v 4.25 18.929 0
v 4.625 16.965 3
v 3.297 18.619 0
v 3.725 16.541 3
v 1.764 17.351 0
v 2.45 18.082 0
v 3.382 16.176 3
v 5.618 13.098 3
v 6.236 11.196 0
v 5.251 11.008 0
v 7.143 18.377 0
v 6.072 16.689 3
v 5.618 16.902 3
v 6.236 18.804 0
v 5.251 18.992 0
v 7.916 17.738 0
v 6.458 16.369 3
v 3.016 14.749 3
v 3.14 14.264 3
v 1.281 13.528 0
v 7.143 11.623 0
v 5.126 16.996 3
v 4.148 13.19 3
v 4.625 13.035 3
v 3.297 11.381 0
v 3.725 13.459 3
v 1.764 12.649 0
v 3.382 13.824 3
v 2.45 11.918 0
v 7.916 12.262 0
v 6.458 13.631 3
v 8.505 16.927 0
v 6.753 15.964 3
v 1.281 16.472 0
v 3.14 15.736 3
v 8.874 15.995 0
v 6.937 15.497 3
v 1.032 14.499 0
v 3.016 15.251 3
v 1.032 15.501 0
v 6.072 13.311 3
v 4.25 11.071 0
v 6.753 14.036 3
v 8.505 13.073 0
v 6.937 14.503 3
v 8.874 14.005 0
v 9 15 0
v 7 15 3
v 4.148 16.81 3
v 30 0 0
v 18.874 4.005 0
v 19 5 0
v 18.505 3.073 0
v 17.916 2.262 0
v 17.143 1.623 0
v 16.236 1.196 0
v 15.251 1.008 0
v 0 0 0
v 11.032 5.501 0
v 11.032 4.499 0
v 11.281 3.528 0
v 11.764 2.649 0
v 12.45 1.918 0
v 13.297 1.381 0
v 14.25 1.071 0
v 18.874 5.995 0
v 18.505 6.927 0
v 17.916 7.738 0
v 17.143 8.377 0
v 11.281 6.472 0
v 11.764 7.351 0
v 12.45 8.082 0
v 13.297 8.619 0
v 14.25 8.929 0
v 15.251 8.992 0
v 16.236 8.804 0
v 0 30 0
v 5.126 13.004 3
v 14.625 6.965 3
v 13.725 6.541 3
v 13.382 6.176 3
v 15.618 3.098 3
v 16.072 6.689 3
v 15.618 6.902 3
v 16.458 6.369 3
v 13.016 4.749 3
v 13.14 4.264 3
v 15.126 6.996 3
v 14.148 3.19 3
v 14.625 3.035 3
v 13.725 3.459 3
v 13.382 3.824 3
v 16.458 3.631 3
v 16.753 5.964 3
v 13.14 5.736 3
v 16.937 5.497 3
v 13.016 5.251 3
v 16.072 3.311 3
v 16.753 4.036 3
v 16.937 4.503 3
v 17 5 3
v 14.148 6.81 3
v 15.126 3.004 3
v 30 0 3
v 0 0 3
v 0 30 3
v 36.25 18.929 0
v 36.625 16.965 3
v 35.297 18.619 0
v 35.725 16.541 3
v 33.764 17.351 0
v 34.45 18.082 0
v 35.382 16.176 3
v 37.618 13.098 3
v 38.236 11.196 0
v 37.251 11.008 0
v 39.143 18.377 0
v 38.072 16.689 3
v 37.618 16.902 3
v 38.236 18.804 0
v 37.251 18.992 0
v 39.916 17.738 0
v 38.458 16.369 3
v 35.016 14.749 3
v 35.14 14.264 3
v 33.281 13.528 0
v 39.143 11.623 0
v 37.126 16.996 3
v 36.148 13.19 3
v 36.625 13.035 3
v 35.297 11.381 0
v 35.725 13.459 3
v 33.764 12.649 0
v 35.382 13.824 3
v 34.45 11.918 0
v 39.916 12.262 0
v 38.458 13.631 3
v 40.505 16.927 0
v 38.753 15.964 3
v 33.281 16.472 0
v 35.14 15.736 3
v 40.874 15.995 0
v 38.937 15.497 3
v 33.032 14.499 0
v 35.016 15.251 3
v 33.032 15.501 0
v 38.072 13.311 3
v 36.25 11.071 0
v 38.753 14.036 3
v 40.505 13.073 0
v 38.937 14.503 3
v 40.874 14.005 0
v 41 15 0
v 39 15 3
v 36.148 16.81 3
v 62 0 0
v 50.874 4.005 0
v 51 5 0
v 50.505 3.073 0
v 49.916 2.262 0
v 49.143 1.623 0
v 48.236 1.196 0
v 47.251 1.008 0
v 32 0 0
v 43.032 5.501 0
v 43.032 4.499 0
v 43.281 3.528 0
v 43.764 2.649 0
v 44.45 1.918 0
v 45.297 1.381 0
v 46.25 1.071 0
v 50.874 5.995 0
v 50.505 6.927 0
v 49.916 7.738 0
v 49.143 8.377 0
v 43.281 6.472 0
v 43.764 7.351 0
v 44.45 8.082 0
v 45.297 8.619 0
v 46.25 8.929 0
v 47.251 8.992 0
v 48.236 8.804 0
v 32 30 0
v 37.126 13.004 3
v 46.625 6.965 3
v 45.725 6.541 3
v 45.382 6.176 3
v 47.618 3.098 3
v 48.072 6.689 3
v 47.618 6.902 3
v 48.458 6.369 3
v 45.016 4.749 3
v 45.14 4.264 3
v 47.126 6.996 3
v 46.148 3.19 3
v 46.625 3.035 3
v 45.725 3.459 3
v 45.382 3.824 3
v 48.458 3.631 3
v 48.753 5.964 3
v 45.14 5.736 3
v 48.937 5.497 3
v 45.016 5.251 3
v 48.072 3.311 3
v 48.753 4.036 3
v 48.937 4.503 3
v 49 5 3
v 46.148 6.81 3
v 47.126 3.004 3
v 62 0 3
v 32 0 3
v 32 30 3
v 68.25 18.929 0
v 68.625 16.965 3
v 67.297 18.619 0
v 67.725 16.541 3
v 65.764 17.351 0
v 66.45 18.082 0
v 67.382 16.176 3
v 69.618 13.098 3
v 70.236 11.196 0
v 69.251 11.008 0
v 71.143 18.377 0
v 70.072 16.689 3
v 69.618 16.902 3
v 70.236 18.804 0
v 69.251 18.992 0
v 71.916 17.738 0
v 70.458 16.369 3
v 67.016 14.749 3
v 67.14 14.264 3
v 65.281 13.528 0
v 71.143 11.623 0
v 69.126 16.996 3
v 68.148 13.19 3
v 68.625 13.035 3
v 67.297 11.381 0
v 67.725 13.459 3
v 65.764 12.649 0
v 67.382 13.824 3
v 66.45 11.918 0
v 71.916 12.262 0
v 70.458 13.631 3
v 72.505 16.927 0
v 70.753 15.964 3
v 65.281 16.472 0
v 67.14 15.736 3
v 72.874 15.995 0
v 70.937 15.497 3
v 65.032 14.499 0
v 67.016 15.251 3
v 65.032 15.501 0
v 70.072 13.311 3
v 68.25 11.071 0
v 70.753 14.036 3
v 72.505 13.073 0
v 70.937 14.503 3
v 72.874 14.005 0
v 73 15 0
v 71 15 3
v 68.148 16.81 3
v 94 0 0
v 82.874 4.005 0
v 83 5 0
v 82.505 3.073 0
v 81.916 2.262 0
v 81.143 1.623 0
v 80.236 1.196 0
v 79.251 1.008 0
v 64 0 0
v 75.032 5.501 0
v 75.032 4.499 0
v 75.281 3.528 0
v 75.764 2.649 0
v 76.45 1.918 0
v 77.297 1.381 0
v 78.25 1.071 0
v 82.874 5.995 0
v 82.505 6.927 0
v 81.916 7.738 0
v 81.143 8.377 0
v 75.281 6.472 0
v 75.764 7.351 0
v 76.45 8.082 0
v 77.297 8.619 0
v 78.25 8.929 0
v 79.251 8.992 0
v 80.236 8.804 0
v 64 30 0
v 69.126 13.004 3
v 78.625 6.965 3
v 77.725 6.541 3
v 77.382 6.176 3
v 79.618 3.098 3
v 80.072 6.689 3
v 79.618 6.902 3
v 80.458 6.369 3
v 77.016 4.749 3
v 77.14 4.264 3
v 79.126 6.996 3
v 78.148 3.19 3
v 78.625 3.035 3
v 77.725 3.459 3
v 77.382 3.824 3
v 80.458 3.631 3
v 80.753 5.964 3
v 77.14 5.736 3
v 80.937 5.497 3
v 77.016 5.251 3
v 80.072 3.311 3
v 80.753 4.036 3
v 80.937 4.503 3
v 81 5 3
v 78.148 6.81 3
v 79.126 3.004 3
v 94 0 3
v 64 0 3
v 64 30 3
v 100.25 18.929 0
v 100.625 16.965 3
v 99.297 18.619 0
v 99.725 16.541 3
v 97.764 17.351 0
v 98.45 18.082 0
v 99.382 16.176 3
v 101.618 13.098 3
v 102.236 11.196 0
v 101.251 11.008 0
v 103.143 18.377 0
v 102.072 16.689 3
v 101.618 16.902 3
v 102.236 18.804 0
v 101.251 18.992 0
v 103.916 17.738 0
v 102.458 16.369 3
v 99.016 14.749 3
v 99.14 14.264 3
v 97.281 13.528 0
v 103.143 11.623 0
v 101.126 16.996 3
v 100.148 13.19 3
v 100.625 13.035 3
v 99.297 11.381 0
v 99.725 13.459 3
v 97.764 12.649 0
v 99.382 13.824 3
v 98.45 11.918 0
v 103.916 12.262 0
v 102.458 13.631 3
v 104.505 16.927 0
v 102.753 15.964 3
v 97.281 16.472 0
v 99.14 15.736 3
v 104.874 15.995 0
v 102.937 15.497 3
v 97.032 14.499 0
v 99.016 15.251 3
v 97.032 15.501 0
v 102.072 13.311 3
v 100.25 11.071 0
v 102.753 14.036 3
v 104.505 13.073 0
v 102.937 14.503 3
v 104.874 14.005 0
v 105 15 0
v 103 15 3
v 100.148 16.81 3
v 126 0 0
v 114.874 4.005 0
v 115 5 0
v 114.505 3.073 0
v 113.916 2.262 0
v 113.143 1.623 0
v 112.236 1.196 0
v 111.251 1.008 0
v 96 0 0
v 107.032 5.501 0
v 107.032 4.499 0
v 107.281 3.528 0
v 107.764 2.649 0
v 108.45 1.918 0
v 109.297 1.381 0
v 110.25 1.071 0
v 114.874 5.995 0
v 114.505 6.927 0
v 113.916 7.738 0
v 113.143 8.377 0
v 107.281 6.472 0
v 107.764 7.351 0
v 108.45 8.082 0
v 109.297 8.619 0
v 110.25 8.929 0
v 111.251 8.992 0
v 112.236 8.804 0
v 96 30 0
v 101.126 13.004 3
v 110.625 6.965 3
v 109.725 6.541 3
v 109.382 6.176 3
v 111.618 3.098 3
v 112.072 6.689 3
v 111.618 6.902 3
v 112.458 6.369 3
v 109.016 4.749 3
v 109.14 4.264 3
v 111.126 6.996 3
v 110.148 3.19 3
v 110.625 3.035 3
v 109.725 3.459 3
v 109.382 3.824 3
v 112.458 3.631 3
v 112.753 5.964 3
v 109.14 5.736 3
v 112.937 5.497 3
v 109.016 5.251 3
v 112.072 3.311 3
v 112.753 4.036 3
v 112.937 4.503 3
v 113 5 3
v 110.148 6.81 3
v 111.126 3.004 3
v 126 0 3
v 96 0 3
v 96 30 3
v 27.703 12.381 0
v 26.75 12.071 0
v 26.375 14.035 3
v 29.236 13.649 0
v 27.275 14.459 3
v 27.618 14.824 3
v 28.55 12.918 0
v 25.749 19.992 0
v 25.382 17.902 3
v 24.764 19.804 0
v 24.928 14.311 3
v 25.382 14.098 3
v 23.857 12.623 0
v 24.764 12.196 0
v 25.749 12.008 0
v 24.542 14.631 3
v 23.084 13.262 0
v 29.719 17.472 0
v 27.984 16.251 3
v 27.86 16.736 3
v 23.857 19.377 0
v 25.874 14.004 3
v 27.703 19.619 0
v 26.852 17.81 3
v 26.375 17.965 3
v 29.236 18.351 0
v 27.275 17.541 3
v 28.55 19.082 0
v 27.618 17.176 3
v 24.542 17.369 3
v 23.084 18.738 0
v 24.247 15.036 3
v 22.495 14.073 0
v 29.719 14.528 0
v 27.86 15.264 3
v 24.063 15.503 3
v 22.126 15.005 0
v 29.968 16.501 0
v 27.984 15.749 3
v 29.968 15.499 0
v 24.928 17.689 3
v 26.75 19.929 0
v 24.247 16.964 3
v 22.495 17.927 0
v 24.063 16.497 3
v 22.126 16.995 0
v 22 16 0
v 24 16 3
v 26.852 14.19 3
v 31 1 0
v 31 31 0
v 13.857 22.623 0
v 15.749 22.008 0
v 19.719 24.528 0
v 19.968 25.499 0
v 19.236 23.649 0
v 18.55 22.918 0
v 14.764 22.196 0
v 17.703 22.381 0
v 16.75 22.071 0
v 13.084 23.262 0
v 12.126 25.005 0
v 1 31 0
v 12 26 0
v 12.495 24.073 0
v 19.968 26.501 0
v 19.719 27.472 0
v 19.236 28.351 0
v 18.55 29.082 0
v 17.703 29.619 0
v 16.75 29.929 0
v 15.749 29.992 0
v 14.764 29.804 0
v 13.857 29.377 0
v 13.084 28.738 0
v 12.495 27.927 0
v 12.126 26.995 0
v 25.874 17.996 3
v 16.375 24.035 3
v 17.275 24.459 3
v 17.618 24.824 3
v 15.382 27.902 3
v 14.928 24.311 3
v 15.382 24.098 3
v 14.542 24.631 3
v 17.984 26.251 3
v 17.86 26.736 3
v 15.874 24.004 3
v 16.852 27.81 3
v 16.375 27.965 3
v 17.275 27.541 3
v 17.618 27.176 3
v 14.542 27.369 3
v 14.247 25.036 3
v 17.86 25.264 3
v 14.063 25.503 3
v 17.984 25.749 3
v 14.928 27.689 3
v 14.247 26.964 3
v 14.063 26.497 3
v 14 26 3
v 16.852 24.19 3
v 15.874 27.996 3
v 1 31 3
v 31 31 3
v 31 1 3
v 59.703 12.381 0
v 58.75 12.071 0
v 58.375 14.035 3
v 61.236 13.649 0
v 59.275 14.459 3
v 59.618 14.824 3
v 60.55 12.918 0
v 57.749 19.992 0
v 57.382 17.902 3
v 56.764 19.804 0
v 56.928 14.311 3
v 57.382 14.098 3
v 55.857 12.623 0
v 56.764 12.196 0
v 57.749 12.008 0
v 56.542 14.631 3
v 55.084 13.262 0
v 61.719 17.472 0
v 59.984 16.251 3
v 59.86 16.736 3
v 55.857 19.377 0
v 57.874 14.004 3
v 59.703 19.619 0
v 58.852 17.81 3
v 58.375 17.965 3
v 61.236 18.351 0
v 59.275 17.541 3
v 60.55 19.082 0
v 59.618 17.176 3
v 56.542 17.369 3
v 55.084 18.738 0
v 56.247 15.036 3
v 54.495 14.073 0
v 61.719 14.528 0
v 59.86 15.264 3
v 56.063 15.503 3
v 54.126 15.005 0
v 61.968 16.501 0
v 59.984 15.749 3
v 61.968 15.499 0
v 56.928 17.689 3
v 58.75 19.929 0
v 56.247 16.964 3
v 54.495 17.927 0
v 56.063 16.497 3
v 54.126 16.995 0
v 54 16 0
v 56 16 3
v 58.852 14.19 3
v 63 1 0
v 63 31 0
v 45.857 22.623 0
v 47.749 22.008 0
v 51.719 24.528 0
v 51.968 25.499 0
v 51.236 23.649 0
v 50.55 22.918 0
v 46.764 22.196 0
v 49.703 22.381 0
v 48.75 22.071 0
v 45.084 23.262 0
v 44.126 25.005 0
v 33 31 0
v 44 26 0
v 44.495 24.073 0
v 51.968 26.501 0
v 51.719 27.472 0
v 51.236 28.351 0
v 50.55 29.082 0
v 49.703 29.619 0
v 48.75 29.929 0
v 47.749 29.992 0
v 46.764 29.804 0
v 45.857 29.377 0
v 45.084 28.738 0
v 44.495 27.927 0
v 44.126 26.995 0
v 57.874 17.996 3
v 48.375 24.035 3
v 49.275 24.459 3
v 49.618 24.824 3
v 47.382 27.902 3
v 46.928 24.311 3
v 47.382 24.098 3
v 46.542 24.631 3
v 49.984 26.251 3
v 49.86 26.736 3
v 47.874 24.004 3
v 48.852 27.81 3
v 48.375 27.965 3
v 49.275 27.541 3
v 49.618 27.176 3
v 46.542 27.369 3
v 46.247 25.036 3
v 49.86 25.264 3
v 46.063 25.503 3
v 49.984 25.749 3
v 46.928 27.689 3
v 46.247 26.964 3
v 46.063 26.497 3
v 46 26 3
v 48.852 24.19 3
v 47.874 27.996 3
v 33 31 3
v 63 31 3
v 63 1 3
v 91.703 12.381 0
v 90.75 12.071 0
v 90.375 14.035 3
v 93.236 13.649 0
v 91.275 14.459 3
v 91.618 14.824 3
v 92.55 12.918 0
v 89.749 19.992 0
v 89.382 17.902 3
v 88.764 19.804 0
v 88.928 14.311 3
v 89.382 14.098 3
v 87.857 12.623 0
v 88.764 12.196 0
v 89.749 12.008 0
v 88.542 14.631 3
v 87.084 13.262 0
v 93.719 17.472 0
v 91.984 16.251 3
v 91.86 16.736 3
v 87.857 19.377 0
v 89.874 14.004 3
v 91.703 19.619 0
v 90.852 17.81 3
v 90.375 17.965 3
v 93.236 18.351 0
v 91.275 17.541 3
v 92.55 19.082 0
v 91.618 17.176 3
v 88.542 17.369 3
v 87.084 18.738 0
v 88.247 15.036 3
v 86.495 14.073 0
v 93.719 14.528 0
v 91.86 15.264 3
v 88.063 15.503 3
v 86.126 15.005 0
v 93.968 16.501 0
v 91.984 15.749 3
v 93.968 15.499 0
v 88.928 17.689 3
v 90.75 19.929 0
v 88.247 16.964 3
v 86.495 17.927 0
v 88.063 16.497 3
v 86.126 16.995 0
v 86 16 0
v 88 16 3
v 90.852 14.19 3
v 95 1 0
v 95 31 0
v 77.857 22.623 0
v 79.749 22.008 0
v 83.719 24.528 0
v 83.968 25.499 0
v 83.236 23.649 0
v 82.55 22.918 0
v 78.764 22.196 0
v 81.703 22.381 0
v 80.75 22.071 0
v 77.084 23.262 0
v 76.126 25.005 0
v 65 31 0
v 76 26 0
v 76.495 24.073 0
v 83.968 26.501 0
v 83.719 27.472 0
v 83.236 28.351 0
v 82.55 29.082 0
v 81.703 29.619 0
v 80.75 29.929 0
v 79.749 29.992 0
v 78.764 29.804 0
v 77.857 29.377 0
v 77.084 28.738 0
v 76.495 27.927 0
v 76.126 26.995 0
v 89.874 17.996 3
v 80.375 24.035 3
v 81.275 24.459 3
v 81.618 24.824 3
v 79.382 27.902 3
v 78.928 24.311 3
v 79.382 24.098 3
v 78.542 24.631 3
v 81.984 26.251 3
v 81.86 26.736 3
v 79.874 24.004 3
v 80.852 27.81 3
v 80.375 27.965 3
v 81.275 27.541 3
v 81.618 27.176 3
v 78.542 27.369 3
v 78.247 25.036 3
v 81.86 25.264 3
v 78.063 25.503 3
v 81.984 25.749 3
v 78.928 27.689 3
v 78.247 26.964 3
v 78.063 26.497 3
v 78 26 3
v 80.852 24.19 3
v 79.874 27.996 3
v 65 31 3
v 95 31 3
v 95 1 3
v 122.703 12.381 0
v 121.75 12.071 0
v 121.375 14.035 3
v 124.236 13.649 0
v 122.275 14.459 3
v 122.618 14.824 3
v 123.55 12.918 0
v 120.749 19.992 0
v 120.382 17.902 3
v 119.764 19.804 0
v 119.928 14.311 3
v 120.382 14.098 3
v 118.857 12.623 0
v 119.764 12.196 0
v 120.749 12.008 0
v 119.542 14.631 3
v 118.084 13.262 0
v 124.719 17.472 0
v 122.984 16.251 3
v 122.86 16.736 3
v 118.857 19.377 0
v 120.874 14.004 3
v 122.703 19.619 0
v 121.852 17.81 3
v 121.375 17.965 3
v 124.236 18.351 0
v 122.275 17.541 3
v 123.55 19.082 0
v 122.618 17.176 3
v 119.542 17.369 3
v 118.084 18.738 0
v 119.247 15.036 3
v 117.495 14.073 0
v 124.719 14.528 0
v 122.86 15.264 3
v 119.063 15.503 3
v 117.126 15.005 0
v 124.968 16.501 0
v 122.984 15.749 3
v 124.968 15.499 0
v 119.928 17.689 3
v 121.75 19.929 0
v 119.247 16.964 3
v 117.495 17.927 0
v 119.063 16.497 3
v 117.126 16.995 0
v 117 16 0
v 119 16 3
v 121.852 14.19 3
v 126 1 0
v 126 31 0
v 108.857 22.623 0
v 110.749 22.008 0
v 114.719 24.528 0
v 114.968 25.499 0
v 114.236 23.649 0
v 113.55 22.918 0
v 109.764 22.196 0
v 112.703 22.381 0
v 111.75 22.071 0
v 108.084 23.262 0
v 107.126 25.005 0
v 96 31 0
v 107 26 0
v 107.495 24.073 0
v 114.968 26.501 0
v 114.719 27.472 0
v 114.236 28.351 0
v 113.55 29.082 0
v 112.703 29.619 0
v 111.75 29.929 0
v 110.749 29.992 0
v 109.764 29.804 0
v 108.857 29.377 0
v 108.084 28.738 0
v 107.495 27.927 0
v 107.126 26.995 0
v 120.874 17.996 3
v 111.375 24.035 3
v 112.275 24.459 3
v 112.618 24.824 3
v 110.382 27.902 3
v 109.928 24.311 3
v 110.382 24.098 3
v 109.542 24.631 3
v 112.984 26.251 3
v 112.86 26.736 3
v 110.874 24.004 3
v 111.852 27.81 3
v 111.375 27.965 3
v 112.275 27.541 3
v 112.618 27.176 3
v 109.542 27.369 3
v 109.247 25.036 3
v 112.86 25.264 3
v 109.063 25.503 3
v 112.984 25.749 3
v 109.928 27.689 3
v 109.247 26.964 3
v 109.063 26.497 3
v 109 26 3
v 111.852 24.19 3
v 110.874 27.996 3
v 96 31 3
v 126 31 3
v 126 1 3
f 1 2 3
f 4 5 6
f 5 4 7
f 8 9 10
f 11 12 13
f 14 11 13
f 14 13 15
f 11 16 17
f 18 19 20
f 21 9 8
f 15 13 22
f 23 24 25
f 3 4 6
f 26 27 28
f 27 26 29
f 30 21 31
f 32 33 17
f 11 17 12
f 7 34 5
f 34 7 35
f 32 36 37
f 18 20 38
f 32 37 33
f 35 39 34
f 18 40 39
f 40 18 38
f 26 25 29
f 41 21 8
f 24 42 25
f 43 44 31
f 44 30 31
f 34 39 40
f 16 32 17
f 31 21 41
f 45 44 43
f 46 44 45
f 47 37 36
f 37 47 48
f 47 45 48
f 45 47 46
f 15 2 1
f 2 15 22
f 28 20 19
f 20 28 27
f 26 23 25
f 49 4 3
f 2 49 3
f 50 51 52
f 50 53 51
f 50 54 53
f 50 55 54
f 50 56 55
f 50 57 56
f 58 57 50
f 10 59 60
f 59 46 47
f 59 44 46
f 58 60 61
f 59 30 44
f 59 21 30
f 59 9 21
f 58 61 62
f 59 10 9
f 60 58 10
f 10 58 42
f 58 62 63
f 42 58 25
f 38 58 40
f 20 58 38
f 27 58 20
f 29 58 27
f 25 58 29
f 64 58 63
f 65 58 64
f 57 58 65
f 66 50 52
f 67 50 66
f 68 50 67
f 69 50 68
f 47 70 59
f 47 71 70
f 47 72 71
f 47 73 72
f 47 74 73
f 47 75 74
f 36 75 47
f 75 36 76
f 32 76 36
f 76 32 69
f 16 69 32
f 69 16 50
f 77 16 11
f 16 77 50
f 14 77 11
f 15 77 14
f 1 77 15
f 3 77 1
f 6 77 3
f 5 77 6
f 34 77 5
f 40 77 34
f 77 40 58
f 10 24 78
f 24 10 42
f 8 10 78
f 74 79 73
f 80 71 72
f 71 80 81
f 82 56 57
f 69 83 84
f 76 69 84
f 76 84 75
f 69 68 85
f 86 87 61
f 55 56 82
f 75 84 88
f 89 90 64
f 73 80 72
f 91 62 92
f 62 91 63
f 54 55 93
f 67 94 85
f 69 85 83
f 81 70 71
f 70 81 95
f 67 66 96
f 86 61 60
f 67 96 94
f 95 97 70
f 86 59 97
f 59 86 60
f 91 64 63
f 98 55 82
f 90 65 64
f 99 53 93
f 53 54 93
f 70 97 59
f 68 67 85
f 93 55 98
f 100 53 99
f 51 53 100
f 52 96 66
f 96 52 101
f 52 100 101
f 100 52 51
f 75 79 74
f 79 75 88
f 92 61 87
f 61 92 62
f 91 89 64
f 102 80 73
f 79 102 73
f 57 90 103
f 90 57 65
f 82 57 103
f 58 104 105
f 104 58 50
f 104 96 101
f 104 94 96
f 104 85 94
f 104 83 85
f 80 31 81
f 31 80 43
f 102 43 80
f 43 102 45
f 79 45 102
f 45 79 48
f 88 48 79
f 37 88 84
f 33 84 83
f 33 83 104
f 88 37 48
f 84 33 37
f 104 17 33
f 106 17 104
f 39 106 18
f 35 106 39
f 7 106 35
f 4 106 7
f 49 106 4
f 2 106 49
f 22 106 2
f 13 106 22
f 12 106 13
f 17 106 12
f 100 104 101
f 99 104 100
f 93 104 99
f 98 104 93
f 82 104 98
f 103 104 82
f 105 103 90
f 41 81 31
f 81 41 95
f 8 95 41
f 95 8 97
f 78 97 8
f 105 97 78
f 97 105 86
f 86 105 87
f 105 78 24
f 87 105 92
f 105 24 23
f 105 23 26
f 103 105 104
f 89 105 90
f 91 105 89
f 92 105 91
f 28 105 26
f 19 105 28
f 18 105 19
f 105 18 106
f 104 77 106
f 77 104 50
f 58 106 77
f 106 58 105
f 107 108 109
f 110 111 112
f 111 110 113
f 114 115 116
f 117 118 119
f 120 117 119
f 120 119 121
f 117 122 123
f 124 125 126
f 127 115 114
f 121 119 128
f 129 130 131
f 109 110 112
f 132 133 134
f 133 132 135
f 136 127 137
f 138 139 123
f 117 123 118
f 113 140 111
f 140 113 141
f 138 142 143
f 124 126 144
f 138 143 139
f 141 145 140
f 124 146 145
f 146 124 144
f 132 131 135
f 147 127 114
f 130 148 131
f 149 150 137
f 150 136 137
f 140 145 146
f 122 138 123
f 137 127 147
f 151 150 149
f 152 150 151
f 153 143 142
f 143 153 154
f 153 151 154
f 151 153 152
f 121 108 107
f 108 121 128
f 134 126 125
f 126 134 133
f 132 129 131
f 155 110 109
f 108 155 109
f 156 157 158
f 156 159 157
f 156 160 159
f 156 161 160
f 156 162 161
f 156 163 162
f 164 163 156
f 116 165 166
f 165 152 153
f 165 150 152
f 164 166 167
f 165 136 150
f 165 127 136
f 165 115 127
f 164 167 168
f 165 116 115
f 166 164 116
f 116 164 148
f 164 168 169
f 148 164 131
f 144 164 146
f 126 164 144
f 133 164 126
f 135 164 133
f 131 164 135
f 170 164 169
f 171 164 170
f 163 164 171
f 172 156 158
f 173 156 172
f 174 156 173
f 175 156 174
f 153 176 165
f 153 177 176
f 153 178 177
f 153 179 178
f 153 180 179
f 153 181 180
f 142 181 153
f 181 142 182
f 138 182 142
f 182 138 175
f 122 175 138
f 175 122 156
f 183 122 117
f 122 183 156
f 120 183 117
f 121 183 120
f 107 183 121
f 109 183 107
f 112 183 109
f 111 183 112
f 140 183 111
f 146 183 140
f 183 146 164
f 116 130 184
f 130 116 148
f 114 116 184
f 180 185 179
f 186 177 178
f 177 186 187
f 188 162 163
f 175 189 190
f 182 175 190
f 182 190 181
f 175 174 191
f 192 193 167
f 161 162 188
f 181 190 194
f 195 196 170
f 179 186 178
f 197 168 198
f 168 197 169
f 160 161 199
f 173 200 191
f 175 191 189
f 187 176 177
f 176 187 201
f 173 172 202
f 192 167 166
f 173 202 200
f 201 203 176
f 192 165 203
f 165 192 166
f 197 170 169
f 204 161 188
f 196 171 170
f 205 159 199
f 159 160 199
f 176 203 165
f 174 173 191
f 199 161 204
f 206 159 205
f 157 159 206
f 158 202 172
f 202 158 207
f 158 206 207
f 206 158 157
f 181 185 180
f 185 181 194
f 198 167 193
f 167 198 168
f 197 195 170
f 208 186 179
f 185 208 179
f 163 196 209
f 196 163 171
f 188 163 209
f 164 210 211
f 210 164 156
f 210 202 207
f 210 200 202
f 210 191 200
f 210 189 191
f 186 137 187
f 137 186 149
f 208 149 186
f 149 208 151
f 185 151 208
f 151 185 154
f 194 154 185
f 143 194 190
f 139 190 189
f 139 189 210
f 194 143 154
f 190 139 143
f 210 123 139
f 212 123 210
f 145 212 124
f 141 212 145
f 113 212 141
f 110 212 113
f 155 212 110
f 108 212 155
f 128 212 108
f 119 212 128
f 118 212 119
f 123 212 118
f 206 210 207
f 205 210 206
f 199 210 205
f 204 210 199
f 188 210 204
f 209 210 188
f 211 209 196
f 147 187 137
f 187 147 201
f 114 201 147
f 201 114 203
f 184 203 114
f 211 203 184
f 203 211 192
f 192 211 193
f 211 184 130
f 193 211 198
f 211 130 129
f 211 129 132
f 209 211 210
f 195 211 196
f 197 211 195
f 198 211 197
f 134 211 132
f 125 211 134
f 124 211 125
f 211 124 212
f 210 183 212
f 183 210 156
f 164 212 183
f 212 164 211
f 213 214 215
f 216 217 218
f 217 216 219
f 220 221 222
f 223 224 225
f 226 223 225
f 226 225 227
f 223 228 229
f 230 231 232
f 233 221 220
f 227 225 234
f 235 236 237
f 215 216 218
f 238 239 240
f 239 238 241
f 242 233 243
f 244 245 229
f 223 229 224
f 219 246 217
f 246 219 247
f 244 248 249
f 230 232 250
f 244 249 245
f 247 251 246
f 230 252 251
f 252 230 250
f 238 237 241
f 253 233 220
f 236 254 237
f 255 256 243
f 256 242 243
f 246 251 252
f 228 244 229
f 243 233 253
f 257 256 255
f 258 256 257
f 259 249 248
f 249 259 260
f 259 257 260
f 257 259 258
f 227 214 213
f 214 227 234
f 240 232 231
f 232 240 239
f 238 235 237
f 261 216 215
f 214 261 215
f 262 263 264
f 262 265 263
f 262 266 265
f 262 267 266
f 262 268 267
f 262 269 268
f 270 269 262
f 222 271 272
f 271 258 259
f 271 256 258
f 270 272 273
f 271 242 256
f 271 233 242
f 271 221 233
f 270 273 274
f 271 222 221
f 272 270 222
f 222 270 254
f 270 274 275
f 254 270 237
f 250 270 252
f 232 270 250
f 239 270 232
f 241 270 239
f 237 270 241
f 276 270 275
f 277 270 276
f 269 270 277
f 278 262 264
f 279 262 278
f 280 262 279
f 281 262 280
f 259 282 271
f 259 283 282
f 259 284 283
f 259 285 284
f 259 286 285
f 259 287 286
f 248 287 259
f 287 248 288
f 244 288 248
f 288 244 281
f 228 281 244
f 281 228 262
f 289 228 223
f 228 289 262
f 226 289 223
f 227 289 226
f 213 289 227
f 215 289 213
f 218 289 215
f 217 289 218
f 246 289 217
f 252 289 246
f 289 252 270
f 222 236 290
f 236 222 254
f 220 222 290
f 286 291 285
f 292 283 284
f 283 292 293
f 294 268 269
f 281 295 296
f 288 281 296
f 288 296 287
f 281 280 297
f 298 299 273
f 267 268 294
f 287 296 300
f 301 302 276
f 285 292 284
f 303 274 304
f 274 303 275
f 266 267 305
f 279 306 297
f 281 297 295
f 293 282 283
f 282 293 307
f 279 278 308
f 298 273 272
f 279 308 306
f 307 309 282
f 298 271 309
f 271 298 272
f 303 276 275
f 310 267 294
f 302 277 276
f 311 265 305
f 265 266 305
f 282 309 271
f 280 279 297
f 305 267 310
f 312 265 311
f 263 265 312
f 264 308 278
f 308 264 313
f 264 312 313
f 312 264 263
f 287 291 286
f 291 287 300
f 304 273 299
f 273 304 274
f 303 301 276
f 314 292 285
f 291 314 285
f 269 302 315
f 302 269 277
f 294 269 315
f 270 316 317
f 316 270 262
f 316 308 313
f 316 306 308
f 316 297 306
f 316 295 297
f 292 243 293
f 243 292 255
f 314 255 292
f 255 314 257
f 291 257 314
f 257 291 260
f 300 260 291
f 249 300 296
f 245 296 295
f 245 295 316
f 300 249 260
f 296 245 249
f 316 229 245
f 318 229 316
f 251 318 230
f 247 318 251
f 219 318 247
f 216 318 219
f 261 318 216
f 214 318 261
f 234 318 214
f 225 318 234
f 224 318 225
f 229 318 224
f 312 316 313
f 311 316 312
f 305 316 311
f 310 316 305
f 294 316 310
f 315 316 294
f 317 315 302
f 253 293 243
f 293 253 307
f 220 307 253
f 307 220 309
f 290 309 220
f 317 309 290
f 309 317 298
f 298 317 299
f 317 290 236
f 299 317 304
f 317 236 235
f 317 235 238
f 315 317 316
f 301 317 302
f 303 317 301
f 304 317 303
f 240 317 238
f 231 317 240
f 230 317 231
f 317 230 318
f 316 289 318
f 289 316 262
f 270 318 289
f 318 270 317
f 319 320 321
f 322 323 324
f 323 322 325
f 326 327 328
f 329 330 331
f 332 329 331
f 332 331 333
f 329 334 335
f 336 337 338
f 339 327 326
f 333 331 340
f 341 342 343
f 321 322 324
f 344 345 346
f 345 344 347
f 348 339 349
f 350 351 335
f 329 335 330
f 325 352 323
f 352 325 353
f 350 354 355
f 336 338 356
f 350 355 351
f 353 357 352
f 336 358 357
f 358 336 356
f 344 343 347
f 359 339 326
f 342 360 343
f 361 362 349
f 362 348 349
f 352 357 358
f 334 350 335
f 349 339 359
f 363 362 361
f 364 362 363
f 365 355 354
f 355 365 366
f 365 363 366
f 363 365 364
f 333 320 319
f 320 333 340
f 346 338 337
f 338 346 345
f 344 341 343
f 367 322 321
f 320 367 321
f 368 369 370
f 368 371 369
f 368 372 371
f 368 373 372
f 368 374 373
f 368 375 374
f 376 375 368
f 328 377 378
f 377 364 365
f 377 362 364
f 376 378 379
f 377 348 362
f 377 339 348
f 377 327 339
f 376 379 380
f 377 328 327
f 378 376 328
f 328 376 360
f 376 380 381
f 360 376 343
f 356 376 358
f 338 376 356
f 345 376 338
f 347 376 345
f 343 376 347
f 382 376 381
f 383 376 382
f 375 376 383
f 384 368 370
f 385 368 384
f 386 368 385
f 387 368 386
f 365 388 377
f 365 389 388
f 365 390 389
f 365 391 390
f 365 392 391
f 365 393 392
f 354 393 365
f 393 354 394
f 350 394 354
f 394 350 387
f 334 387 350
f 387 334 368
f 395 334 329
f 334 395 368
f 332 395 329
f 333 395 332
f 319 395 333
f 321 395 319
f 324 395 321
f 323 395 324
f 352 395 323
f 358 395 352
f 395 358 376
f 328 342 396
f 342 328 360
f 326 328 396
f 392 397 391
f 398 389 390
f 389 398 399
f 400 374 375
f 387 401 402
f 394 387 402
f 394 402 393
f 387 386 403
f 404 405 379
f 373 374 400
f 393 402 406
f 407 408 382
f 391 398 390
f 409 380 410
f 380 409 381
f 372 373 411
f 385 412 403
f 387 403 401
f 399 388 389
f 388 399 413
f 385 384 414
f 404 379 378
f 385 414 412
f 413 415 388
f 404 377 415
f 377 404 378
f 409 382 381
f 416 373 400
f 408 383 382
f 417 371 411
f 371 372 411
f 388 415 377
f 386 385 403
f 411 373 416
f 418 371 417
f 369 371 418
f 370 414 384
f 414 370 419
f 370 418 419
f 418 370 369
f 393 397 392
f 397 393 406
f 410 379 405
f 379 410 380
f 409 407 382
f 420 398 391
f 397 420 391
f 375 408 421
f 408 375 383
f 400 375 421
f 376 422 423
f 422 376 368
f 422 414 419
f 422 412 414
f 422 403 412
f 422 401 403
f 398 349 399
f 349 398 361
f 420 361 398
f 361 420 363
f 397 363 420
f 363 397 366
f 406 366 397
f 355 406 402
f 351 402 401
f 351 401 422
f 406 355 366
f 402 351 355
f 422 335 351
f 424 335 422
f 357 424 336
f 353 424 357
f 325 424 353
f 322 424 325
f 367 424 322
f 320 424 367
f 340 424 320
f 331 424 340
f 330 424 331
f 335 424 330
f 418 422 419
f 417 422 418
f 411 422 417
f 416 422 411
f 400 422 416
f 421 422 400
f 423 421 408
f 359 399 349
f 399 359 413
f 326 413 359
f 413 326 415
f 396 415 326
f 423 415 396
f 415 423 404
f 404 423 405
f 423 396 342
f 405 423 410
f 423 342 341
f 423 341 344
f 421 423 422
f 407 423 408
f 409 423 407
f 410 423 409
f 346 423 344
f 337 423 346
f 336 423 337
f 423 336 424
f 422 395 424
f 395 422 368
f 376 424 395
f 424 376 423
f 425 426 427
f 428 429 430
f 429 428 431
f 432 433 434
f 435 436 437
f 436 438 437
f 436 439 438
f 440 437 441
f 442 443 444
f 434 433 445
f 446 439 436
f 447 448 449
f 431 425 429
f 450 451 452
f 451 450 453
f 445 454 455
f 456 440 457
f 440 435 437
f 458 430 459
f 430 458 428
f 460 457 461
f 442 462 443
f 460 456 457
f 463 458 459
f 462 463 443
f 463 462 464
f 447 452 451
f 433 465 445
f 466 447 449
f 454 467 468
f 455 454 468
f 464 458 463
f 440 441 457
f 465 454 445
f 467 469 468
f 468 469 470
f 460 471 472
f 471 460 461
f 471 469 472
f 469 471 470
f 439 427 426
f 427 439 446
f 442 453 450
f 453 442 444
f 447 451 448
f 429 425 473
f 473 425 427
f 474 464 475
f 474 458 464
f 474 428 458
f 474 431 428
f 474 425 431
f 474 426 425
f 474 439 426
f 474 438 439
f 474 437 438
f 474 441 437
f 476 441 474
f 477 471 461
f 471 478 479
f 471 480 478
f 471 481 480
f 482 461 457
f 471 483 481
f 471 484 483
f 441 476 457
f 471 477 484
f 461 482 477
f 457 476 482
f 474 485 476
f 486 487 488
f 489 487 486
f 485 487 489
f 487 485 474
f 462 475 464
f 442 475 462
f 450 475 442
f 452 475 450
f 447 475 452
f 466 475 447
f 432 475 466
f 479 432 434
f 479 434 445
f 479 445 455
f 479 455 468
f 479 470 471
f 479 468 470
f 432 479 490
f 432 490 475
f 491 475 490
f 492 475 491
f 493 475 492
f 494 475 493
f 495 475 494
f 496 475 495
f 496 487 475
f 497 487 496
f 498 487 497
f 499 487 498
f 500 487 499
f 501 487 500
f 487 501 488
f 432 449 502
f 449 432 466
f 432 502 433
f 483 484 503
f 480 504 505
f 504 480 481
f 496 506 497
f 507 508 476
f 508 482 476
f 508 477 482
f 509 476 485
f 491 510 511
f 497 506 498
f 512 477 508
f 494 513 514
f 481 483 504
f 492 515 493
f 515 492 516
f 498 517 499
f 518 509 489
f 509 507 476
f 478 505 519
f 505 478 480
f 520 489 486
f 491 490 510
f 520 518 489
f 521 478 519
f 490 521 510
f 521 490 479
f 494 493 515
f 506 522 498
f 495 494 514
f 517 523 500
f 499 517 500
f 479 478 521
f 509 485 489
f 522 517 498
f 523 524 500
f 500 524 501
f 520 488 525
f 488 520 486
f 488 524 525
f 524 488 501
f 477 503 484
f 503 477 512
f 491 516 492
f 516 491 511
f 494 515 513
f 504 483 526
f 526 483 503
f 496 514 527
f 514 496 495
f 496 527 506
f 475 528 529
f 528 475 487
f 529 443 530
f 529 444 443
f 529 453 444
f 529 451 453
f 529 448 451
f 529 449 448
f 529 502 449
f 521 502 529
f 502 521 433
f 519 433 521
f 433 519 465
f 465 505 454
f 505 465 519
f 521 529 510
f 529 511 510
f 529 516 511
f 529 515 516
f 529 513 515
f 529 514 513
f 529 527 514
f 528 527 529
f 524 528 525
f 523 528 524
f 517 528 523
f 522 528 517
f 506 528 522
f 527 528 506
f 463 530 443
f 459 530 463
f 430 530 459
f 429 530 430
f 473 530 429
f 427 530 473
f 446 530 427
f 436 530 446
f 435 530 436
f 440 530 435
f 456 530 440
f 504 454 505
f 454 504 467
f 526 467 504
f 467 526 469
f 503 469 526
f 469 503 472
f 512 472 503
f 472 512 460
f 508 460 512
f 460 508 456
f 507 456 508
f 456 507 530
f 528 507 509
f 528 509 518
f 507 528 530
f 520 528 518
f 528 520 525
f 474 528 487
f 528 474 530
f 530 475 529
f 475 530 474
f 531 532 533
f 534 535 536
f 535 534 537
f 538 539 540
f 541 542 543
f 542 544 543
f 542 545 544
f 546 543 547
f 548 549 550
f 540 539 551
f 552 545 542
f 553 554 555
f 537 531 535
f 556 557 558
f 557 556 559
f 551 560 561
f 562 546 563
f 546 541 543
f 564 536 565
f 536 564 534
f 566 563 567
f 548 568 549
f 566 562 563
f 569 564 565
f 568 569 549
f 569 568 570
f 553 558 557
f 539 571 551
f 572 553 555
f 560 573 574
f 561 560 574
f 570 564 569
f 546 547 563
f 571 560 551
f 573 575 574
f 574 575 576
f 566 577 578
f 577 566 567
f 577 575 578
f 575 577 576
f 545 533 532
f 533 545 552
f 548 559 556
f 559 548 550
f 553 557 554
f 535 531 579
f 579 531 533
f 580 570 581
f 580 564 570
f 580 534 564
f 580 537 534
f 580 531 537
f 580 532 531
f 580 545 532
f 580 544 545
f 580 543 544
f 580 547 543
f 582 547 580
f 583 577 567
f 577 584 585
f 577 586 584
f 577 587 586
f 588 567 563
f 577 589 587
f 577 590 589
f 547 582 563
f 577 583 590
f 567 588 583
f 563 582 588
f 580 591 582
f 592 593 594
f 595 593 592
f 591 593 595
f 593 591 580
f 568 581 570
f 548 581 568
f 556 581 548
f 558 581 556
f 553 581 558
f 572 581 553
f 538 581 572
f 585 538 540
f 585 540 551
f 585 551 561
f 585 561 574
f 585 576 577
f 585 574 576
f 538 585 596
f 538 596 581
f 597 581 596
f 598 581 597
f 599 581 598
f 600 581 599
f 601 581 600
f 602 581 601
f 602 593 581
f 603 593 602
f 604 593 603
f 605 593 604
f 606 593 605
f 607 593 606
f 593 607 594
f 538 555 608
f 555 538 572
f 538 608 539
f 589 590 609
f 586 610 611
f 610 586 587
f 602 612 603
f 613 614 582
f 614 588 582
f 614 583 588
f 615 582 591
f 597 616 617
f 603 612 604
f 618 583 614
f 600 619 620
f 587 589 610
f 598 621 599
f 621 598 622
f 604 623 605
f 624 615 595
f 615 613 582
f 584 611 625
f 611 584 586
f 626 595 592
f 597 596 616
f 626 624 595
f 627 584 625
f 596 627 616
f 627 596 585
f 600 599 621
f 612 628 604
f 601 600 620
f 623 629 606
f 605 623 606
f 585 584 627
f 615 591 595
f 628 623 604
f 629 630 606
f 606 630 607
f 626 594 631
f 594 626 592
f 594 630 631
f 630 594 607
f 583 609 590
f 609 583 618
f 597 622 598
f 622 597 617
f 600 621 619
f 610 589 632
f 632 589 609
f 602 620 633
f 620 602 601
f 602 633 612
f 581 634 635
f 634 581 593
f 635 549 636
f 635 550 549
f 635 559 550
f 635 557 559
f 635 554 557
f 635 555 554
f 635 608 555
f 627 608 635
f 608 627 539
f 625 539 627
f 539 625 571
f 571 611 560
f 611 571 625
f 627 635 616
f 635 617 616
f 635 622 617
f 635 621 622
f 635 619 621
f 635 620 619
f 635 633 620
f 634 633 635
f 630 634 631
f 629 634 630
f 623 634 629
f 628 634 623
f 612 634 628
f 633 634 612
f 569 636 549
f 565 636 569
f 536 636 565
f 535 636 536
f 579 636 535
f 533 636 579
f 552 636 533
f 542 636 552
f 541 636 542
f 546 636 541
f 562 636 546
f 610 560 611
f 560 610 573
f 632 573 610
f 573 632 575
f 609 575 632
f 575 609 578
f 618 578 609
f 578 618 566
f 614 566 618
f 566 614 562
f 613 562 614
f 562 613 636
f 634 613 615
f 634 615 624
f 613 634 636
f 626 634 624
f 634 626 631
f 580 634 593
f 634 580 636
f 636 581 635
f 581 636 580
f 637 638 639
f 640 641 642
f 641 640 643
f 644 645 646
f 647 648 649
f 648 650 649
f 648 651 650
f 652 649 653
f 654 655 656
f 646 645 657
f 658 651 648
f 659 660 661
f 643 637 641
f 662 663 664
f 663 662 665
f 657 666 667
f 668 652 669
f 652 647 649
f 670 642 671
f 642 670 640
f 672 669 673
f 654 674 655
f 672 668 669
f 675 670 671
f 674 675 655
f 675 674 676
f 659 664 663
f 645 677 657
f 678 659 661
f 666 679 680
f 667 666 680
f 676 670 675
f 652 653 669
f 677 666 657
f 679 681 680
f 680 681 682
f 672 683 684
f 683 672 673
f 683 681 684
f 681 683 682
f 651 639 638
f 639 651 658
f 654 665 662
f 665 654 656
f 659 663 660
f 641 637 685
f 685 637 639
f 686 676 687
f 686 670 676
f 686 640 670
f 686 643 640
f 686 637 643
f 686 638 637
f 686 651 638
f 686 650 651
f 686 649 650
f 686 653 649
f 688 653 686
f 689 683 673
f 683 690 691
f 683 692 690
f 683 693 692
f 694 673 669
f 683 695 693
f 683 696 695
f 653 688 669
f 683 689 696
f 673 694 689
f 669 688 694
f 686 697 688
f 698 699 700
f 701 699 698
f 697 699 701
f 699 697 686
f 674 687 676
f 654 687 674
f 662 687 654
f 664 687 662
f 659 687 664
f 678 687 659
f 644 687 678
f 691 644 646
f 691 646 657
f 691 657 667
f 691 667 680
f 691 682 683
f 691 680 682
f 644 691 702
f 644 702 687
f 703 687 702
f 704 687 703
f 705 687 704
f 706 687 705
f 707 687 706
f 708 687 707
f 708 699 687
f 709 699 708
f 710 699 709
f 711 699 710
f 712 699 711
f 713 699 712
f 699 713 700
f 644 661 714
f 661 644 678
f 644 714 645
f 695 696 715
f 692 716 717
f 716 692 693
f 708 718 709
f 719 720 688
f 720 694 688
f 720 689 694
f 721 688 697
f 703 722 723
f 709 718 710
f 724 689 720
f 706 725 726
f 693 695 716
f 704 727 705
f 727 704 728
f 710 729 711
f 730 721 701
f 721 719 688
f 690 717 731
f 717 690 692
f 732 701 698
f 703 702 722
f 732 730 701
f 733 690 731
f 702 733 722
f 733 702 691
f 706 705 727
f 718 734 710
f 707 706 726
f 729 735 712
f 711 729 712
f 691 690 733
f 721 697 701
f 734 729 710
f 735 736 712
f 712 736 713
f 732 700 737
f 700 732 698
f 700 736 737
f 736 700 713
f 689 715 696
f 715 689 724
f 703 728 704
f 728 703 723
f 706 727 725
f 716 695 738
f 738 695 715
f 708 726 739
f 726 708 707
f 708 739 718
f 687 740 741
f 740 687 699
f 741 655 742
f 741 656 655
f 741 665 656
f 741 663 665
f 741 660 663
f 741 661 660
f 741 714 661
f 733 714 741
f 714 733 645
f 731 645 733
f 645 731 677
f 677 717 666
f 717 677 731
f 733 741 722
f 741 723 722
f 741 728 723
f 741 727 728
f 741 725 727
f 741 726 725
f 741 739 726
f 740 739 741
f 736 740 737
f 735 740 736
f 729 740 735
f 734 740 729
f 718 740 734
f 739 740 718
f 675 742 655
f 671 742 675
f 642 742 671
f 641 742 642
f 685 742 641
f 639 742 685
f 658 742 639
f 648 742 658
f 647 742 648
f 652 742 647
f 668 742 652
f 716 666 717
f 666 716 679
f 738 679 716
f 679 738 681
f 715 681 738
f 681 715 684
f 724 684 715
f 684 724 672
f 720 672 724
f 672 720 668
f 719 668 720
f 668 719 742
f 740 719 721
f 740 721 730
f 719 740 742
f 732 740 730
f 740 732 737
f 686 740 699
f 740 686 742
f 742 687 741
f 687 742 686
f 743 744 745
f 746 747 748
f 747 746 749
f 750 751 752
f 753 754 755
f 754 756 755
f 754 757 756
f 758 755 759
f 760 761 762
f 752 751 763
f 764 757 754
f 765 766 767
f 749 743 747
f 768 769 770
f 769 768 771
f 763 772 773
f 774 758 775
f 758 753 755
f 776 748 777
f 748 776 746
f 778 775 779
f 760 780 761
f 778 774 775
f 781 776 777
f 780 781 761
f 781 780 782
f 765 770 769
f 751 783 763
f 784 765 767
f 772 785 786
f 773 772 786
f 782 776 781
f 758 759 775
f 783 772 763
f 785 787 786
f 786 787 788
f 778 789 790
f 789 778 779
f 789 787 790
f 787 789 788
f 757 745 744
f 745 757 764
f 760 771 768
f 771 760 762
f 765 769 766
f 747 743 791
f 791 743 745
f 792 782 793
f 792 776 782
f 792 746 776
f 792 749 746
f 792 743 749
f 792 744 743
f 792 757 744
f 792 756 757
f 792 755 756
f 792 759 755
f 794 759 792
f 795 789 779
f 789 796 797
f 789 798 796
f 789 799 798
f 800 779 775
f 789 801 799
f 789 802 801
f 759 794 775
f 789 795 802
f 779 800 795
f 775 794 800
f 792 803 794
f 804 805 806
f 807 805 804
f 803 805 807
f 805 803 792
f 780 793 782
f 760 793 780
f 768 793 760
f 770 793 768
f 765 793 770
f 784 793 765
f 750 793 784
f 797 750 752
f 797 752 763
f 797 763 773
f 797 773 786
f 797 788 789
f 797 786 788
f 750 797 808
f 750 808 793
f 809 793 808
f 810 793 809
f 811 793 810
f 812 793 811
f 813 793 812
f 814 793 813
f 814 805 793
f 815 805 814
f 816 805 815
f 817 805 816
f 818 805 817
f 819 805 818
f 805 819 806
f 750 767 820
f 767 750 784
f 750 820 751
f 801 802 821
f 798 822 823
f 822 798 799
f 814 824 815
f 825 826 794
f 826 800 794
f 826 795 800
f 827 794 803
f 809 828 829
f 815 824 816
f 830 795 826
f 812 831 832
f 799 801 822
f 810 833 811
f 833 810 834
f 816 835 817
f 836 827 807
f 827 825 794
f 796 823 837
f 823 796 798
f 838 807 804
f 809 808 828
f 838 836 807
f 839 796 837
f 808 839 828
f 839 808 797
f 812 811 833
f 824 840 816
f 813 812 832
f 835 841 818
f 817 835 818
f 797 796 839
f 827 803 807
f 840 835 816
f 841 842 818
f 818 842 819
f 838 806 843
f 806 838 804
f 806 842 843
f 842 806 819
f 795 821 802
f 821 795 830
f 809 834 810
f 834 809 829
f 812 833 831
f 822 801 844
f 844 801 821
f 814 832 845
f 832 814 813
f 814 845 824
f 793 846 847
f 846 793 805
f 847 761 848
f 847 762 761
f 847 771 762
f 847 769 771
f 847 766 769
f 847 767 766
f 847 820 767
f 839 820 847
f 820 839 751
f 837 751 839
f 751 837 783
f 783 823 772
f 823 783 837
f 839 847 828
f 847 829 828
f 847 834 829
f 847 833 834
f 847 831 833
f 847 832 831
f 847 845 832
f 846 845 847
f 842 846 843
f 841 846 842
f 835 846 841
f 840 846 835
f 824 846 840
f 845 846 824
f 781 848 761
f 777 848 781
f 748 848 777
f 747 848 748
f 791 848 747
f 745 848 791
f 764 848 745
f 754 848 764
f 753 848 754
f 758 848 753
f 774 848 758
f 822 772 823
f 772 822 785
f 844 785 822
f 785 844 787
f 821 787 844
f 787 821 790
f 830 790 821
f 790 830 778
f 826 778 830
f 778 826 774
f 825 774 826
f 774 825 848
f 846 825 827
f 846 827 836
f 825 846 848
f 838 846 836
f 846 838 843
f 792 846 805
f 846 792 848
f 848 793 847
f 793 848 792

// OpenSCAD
module s(){
 
    
 union(){
 translate([0,0,0]) cylinder(d1=8,d2=4,h=3, $fn=25);
     cylinder(d=4,h=10, $fn=25);
 }
}






//difference(){
//    
//union(){
//cube([50,10,5]);
//cube([10,50,5]);
//}
//
//translate([20,5,0]) s();
//translate([40,5,0]) s();
//
//translate([5,20,0]) s();
//translate([5,40,0]) s();
//}
//
//
//translate([10,10,-10])
//difference(){
// cube([40,40,15]);
//
//translate([10,10,0]) cube([20,20,10]);
//}

module c(){
difference(){
linear_extrude(height=3) polygon(points=[[0,0],[30,0], [0,30]]);

translate([5,15,0]) s();
translate([15,5,0]) s();
}
}


translate([0,0,0]) c();

translate([32,0,0]) c();

translate([64,0,0]) c();

translate([96,0,0]) c();

translate([31,31,0]) rotate([0,0,-180]) c();

translate([63,31,0]) rotate([0,0,-180]) c();

translate([95,31,0]) rotate([0,0,-180]) c();

translate([126,31,0]) rotate([0,0,-180]) c();



//translate([0,32,0]) {
//translate([0,0,0]) c();
//
//translate([32,0,0]) c();
//
//translate([64,0,0]) c();
//
//translate([96,0,0]) c();
//
//translate([31,31,0]) rotate([0,0,-180]) c();
//
//translate([63,31,0]) rotate([0,0,-180]) c();
//
//translate([95,31,0]) rotate([0,0,-180]) c();
//
//translate([126,31,0]) rotate([0,0,-180]) c();
//    
//}
